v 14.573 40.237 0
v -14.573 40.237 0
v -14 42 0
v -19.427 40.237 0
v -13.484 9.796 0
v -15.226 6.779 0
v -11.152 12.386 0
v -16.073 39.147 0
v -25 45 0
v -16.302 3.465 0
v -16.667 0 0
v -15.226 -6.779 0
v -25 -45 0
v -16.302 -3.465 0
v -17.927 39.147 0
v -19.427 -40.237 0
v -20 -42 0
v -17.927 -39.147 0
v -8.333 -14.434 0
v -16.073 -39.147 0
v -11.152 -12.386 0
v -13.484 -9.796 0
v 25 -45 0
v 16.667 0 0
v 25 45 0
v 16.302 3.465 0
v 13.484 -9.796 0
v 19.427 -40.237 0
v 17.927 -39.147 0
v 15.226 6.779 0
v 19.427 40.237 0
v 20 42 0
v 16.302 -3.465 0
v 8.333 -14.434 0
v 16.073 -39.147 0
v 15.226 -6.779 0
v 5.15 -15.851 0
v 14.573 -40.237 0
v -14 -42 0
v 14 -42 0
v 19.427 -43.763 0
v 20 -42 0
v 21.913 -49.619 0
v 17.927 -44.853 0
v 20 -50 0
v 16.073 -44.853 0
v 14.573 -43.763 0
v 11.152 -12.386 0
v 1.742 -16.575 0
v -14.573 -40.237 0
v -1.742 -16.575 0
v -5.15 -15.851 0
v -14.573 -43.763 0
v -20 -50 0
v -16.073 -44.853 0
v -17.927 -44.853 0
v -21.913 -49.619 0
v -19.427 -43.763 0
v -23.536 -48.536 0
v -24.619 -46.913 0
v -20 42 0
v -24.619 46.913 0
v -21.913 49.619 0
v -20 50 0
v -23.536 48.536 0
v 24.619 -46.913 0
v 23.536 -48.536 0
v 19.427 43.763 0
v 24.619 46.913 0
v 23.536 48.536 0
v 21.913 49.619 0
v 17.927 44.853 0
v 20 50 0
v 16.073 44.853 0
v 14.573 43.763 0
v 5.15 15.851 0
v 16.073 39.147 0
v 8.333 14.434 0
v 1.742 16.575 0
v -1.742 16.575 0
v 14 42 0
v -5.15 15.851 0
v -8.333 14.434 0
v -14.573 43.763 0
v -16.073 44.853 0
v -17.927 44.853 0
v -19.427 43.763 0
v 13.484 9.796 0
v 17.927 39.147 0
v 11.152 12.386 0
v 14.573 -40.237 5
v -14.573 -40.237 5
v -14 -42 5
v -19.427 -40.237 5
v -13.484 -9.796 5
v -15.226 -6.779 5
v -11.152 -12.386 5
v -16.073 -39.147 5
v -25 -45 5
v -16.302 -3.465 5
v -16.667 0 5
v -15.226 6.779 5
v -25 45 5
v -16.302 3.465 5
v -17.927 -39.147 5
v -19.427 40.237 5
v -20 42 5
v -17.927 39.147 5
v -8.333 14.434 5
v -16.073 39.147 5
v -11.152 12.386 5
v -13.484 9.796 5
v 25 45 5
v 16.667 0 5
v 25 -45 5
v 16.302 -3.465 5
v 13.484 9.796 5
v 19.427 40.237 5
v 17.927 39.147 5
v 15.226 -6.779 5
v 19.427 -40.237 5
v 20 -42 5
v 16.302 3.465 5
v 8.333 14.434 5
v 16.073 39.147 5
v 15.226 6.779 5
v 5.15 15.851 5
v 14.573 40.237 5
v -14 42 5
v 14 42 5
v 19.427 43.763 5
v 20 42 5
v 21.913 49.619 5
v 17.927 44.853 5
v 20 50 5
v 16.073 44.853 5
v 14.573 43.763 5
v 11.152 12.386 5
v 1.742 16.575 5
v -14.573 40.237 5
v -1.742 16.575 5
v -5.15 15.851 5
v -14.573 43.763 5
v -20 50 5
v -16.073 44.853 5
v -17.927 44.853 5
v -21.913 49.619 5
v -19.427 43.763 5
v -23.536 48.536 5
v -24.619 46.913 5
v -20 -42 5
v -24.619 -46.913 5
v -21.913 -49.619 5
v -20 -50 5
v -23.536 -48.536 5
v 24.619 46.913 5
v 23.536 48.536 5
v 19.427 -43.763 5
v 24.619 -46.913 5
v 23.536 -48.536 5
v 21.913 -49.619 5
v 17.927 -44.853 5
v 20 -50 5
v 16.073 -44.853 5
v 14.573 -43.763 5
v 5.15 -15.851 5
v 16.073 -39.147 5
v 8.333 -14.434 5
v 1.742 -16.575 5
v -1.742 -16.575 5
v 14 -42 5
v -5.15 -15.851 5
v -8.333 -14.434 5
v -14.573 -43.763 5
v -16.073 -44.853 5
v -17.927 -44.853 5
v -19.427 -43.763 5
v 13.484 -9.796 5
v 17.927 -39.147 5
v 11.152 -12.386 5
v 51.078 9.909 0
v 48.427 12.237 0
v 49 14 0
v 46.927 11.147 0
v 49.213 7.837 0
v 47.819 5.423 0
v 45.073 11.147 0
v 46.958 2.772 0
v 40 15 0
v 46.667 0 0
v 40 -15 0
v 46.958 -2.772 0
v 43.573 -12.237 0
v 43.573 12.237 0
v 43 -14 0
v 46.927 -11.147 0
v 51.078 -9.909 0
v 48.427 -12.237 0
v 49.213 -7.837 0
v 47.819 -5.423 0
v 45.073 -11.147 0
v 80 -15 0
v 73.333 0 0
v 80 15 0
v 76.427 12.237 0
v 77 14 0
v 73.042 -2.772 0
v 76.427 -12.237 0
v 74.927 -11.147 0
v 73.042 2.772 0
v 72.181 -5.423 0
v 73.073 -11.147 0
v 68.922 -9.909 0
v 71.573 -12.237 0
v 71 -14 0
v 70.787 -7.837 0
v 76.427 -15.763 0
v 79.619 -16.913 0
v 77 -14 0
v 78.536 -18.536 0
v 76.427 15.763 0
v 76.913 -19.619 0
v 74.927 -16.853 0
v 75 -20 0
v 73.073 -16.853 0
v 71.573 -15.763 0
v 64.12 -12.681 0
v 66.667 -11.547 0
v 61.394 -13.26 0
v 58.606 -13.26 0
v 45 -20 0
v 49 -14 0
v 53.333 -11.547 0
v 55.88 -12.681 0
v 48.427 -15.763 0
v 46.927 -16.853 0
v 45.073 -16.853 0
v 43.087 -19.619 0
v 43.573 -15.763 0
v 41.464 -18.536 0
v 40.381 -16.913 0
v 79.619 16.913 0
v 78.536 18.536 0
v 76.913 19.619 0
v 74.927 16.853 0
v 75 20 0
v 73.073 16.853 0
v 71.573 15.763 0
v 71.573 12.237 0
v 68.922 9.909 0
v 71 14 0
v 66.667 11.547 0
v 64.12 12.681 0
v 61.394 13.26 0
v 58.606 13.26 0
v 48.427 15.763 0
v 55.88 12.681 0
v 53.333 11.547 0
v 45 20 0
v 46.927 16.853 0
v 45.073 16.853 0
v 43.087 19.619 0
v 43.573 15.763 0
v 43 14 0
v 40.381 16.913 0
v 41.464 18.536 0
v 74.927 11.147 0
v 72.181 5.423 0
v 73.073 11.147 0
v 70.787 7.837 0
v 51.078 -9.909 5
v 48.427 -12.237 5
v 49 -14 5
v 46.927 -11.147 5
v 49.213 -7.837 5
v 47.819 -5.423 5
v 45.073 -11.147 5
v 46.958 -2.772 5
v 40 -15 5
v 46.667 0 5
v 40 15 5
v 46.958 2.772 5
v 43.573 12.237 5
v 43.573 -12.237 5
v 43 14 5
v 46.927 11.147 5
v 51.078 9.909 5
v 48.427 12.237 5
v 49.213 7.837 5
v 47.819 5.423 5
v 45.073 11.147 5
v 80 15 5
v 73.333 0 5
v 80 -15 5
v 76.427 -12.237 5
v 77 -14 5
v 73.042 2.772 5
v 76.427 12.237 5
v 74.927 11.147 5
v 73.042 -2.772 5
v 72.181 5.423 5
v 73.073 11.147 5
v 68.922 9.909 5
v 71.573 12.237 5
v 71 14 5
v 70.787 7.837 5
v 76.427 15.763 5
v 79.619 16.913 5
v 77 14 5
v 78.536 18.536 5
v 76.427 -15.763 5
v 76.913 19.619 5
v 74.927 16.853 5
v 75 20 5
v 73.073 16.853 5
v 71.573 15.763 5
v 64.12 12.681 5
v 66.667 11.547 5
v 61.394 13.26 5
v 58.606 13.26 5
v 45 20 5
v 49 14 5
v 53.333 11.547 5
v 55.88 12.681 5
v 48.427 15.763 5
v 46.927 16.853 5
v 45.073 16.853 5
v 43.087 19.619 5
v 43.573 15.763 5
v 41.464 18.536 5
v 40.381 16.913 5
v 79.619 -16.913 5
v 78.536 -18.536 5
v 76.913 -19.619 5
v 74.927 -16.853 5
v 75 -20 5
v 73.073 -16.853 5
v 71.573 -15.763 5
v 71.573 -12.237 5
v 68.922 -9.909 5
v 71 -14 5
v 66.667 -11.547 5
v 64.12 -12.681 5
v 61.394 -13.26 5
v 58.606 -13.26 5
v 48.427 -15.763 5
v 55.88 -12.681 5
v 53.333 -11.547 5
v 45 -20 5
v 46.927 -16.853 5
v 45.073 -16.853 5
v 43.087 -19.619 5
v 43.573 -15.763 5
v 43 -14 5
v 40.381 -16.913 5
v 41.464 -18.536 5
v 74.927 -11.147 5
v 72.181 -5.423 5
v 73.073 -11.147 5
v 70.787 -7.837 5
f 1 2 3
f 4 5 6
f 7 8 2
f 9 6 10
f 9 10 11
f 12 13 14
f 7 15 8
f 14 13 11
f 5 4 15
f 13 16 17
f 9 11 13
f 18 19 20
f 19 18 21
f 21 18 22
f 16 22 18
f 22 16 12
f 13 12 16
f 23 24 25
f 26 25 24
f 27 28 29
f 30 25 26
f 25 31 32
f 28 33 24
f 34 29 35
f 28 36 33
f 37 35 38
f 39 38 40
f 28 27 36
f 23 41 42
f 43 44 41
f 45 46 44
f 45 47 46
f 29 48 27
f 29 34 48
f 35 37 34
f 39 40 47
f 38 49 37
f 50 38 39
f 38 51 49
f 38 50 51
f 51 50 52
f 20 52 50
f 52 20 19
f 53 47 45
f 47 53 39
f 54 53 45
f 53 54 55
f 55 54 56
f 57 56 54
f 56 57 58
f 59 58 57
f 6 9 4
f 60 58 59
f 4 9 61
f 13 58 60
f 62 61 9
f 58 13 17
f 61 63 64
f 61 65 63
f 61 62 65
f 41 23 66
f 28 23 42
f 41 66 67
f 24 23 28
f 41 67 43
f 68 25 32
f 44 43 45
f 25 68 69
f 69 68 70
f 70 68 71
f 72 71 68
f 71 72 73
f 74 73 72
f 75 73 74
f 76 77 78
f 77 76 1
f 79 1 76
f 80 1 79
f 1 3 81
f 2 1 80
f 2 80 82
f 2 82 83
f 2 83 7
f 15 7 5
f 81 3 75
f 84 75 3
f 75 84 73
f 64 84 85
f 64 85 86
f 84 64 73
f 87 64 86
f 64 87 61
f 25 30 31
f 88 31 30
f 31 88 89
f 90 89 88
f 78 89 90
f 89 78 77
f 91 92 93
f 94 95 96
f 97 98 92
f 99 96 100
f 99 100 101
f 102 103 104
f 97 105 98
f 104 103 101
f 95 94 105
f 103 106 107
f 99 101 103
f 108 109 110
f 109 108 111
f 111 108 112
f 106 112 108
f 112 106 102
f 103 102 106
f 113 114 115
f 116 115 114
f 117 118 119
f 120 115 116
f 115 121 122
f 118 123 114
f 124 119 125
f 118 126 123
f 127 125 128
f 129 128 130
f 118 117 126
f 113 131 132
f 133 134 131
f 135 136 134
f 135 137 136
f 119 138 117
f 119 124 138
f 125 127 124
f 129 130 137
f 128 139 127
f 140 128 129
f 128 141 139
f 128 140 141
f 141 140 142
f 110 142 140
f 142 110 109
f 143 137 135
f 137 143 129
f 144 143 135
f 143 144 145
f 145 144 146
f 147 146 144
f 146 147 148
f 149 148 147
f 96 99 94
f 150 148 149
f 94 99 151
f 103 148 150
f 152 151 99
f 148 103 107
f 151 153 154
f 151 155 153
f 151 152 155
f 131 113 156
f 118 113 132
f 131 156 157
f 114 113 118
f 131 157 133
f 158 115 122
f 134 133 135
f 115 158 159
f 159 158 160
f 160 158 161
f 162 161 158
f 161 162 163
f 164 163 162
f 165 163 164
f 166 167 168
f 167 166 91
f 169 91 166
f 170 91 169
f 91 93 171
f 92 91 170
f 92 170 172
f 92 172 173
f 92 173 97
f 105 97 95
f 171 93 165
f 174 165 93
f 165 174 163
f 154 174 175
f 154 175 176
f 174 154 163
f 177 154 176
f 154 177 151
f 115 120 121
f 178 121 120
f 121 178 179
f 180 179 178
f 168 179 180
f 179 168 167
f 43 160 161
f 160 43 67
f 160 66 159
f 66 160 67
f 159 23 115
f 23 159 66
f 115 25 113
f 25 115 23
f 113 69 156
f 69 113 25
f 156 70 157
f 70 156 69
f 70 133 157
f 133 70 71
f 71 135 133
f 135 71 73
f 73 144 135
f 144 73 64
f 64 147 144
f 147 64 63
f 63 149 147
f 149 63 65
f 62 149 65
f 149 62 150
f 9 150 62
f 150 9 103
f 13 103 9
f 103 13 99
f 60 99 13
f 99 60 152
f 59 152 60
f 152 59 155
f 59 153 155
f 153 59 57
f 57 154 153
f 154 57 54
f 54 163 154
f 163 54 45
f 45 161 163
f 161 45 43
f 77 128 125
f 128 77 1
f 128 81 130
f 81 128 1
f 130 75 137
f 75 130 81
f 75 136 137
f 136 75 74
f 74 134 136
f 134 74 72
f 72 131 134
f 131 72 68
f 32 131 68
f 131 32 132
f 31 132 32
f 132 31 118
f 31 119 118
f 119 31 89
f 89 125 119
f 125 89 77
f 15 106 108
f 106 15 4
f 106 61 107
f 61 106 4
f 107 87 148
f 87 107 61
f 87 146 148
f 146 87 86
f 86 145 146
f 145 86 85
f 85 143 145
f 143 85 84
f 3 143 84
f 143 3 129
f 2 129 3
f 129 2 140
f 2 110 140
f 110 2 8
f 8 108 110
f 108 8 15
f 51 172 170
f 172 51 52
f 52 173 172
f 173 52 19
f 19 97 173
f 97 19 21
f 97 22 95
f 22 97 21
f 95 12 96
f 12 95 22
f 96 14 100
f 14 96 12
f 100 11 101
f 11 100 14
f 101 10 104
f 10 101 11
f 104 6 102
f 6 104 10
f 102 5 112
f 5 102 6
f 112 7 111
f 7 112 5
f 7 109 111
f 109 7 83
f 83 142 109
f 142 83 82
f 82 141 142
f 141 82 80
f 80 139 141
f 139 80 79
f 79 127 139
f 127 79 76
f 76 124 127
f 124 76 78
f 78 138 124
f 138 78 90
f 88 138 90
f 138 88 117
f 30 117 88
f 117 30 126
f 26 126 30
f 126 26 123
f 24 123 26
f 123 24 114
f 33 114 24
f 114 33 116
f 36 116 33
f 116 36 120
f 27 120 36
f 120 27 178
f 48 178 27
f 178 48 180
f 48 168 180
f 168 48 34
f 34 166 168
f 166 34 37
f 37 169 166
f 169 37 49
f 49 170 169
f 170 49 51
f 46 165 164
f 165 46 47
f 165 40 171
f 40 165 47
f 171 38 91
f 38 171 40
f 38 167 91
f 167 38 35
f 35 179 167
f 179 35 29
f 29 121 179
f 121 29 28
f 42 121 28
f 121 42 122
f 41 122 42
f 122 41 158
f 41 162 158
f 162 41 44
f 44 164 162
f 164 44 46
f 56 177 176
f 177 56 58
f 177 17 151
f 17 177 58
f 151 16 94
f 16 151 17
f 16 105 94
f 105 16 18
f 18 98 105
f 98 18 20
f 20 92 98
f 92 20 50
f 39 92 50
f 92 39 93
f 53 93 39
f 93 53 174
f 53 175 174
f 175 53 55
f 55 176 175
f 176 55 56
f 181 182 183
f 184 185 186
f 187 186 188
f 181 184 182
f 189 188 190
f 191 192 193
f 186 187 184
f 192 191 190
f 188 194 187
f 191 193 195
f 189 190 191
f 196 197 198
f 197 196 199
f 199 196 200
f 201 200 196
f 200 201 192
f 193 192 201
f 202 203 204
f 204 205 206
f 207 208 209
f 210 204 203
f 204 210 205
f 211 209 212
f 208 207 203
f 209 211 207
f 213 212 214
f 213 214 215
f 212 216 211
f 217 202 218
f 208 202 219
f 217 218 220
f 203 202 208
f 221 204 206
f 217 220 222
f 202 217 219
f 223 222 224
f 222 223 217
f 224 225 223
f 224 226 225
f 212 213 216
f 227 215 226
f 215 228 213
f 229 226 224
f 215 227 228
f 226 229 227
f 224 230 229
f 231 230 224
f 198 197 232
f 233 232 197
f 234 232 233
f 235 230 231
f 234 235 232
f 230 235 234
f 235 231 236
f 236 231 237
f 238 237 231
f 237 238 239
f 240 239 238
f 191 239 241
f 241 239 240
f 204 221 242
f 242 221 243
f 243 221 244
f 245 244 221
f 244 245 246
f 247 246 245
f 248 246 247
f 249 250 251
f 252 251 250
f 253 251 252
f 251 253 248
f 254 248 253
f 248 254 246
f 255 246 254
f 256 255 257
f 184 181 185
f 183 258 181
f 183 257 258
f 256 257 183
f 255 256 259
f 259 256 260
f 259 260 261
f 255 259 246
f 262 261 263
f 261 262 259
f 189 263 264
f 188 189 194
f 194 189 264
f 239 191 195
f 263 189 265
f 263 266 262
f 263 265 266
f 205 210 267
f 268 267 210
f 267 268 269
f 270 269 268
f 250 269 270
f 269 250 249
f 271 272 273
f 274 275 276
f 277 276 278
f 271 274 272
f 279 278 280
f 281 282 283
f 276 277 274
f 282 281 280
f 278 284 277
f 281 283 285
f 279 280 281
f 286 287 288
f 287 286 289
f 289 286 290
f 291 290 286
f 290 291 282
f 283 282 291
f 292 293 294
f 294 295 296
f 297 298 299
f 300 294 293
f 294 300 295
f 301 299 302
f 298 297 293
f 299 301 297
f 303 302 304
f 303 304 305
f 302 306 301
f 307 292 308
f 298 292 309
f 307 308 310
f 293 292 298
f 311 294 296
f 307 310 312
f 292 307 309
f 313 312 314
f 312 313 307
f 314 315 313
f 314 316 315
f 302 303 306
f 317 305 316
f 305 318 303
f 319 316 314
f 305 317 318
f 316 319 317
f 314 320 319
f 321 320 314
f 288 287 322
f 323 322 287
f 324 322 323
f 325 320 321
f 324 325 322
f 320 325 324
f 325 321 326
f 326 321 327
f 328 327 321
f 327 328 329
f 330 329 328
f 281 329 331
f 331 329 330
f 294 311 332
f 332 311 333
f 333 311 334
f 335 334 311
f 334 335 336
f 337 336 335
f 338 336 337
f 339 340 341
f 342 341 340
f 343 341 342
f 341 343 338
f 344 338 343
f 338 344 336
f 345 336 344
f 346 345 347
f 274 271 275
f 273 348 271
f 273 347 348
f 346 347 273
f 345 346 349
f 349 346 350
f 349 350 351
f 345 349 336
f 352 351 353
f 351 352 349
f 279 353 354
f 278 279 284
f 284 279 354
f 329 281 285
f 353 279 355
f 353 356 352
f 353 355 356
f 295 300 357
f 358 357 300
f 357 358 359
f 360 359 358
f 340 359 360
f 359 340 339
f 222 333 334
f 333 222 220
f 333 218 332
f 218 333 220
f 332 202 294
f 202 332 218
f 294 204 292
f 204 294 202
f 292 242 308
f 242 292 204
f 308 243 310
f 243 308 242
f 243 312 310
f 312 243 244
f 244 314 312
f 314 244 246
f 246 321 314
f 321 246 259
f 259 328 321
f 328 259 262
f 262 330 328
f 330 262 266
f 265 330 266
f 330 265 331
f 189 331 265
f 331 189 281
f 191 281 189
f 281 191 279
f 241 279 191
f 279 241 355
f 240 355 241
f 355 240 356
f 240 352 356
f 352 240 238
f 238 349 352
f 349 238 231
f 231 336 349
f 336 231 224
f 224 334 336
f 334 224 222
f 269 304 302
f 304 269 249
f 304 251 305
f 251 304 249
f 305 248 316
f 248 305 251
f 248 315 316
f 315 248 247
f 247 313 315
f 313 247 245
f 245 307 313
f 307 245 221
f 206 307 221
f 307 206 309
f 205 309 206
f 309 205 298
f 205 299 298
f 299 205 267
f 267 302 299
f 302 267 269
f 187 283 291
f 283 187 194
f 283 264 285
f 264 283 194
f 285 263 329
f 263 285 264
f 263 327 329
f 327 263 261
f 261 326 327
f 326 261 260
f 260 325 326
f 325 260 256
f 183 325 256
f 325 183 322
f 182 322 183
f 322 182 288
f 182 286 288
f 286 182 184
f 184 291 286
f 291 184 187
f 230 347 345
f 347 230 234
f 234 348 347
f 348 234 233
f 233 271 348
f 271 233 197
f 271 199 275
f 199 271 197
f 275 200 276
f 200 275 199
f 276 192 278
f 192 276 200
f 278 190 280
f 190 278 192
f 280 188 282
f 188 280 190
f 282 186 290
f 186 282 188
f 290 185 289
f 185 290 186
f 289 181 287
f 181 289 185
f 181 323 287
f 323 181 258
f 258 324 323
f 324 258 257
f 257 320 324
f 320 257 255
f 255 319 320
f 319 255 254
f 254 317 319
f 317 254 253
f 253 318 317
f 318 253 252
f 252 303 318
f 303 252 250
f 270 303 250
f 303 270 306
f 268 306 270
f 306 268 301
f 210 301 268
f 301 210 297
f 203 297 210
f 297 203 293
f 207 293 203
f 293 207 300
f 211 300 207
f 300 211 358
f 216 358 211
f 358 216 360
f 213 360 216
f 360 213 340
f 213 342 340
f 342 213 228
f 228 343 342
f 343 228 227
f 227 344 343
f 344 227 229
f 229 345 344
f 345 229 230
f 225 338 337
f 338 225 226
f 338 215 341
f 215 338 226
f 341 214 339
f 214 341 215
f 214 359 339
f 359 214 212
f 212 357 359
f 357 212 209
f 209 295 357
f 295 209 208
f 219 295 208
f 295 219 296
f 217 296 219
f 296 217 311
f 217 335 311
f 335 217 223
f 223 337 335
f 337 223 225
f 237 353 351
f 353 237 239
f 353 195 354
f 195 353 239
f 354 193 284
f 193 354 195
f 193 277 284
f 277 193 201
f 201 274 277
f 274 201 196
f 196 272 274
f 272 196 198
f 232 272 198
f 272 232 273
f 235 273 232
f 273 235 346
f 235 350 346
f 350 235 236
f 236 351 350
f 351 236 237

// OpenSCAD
// This example combines aspects from all of the other wk1 lessons 
// to show you how to create a modular/reusable object.
// In this example, it's a module that creates a generic mounting plate

// The following block defines the reusable module
// The module has a number of parameters, all with default values
module MountingPlate( width=50, depth=100, thickness=5, holeInset = 8, holeRadius = 3, cornerRadius = 5) {
	// this part will be constructed such that it is centred on the origin
	// and lies on the XY plane

	linear_extrude(thickness)
		difference() {
			// create the outer shape using the hull function
			// the hull of 4 circles produces a rounded rectangle
			
			hull() {
				// use a for loop to vary two variables, x and y
				// this is equivalent to two nested for loops
				for (x=[-1,1], y=[-1,1])
					// translate the circles to the corners of the rectangle
					translate([ 
						x * (width/2 - cornerRadius),  
						y * (depth/2 - cornerRadius),
						0
					 ])
					circle(r=cornerRadius);
			}
			
			
			// subtract the mounting holes:
			// this approach uses mirroring to place the circles to illustrate
			// an alternate technique
			
			for (x=[0,1], y=[0,1])
				mirror([x,0,0]) 
				mirror([0,y,0])
				translate([   
					width/2 - holeInset,
					depth/2 - holeInset,
					0
				])  // move to the top right corner
				circle(r=holeRadius);
				
				
			// Weight Loss!!
			// finally, remove a chunk of material from the middle of plate to save on plastic
			// NB: this is not a robust example, as it relies on the depth being larger than the width
			circle(r=width / 3);
			
		}

}



// We need to "call" the module to actually see a part...   
// if we don't pass any parameters, we'll see the default plate

MountingPlate();


// We could optionally pass some, or all, of the parameters:
translate([60, 0, 0])
	color("red")
	MountingPlate(width=40, depth=40, holeInset=6);
